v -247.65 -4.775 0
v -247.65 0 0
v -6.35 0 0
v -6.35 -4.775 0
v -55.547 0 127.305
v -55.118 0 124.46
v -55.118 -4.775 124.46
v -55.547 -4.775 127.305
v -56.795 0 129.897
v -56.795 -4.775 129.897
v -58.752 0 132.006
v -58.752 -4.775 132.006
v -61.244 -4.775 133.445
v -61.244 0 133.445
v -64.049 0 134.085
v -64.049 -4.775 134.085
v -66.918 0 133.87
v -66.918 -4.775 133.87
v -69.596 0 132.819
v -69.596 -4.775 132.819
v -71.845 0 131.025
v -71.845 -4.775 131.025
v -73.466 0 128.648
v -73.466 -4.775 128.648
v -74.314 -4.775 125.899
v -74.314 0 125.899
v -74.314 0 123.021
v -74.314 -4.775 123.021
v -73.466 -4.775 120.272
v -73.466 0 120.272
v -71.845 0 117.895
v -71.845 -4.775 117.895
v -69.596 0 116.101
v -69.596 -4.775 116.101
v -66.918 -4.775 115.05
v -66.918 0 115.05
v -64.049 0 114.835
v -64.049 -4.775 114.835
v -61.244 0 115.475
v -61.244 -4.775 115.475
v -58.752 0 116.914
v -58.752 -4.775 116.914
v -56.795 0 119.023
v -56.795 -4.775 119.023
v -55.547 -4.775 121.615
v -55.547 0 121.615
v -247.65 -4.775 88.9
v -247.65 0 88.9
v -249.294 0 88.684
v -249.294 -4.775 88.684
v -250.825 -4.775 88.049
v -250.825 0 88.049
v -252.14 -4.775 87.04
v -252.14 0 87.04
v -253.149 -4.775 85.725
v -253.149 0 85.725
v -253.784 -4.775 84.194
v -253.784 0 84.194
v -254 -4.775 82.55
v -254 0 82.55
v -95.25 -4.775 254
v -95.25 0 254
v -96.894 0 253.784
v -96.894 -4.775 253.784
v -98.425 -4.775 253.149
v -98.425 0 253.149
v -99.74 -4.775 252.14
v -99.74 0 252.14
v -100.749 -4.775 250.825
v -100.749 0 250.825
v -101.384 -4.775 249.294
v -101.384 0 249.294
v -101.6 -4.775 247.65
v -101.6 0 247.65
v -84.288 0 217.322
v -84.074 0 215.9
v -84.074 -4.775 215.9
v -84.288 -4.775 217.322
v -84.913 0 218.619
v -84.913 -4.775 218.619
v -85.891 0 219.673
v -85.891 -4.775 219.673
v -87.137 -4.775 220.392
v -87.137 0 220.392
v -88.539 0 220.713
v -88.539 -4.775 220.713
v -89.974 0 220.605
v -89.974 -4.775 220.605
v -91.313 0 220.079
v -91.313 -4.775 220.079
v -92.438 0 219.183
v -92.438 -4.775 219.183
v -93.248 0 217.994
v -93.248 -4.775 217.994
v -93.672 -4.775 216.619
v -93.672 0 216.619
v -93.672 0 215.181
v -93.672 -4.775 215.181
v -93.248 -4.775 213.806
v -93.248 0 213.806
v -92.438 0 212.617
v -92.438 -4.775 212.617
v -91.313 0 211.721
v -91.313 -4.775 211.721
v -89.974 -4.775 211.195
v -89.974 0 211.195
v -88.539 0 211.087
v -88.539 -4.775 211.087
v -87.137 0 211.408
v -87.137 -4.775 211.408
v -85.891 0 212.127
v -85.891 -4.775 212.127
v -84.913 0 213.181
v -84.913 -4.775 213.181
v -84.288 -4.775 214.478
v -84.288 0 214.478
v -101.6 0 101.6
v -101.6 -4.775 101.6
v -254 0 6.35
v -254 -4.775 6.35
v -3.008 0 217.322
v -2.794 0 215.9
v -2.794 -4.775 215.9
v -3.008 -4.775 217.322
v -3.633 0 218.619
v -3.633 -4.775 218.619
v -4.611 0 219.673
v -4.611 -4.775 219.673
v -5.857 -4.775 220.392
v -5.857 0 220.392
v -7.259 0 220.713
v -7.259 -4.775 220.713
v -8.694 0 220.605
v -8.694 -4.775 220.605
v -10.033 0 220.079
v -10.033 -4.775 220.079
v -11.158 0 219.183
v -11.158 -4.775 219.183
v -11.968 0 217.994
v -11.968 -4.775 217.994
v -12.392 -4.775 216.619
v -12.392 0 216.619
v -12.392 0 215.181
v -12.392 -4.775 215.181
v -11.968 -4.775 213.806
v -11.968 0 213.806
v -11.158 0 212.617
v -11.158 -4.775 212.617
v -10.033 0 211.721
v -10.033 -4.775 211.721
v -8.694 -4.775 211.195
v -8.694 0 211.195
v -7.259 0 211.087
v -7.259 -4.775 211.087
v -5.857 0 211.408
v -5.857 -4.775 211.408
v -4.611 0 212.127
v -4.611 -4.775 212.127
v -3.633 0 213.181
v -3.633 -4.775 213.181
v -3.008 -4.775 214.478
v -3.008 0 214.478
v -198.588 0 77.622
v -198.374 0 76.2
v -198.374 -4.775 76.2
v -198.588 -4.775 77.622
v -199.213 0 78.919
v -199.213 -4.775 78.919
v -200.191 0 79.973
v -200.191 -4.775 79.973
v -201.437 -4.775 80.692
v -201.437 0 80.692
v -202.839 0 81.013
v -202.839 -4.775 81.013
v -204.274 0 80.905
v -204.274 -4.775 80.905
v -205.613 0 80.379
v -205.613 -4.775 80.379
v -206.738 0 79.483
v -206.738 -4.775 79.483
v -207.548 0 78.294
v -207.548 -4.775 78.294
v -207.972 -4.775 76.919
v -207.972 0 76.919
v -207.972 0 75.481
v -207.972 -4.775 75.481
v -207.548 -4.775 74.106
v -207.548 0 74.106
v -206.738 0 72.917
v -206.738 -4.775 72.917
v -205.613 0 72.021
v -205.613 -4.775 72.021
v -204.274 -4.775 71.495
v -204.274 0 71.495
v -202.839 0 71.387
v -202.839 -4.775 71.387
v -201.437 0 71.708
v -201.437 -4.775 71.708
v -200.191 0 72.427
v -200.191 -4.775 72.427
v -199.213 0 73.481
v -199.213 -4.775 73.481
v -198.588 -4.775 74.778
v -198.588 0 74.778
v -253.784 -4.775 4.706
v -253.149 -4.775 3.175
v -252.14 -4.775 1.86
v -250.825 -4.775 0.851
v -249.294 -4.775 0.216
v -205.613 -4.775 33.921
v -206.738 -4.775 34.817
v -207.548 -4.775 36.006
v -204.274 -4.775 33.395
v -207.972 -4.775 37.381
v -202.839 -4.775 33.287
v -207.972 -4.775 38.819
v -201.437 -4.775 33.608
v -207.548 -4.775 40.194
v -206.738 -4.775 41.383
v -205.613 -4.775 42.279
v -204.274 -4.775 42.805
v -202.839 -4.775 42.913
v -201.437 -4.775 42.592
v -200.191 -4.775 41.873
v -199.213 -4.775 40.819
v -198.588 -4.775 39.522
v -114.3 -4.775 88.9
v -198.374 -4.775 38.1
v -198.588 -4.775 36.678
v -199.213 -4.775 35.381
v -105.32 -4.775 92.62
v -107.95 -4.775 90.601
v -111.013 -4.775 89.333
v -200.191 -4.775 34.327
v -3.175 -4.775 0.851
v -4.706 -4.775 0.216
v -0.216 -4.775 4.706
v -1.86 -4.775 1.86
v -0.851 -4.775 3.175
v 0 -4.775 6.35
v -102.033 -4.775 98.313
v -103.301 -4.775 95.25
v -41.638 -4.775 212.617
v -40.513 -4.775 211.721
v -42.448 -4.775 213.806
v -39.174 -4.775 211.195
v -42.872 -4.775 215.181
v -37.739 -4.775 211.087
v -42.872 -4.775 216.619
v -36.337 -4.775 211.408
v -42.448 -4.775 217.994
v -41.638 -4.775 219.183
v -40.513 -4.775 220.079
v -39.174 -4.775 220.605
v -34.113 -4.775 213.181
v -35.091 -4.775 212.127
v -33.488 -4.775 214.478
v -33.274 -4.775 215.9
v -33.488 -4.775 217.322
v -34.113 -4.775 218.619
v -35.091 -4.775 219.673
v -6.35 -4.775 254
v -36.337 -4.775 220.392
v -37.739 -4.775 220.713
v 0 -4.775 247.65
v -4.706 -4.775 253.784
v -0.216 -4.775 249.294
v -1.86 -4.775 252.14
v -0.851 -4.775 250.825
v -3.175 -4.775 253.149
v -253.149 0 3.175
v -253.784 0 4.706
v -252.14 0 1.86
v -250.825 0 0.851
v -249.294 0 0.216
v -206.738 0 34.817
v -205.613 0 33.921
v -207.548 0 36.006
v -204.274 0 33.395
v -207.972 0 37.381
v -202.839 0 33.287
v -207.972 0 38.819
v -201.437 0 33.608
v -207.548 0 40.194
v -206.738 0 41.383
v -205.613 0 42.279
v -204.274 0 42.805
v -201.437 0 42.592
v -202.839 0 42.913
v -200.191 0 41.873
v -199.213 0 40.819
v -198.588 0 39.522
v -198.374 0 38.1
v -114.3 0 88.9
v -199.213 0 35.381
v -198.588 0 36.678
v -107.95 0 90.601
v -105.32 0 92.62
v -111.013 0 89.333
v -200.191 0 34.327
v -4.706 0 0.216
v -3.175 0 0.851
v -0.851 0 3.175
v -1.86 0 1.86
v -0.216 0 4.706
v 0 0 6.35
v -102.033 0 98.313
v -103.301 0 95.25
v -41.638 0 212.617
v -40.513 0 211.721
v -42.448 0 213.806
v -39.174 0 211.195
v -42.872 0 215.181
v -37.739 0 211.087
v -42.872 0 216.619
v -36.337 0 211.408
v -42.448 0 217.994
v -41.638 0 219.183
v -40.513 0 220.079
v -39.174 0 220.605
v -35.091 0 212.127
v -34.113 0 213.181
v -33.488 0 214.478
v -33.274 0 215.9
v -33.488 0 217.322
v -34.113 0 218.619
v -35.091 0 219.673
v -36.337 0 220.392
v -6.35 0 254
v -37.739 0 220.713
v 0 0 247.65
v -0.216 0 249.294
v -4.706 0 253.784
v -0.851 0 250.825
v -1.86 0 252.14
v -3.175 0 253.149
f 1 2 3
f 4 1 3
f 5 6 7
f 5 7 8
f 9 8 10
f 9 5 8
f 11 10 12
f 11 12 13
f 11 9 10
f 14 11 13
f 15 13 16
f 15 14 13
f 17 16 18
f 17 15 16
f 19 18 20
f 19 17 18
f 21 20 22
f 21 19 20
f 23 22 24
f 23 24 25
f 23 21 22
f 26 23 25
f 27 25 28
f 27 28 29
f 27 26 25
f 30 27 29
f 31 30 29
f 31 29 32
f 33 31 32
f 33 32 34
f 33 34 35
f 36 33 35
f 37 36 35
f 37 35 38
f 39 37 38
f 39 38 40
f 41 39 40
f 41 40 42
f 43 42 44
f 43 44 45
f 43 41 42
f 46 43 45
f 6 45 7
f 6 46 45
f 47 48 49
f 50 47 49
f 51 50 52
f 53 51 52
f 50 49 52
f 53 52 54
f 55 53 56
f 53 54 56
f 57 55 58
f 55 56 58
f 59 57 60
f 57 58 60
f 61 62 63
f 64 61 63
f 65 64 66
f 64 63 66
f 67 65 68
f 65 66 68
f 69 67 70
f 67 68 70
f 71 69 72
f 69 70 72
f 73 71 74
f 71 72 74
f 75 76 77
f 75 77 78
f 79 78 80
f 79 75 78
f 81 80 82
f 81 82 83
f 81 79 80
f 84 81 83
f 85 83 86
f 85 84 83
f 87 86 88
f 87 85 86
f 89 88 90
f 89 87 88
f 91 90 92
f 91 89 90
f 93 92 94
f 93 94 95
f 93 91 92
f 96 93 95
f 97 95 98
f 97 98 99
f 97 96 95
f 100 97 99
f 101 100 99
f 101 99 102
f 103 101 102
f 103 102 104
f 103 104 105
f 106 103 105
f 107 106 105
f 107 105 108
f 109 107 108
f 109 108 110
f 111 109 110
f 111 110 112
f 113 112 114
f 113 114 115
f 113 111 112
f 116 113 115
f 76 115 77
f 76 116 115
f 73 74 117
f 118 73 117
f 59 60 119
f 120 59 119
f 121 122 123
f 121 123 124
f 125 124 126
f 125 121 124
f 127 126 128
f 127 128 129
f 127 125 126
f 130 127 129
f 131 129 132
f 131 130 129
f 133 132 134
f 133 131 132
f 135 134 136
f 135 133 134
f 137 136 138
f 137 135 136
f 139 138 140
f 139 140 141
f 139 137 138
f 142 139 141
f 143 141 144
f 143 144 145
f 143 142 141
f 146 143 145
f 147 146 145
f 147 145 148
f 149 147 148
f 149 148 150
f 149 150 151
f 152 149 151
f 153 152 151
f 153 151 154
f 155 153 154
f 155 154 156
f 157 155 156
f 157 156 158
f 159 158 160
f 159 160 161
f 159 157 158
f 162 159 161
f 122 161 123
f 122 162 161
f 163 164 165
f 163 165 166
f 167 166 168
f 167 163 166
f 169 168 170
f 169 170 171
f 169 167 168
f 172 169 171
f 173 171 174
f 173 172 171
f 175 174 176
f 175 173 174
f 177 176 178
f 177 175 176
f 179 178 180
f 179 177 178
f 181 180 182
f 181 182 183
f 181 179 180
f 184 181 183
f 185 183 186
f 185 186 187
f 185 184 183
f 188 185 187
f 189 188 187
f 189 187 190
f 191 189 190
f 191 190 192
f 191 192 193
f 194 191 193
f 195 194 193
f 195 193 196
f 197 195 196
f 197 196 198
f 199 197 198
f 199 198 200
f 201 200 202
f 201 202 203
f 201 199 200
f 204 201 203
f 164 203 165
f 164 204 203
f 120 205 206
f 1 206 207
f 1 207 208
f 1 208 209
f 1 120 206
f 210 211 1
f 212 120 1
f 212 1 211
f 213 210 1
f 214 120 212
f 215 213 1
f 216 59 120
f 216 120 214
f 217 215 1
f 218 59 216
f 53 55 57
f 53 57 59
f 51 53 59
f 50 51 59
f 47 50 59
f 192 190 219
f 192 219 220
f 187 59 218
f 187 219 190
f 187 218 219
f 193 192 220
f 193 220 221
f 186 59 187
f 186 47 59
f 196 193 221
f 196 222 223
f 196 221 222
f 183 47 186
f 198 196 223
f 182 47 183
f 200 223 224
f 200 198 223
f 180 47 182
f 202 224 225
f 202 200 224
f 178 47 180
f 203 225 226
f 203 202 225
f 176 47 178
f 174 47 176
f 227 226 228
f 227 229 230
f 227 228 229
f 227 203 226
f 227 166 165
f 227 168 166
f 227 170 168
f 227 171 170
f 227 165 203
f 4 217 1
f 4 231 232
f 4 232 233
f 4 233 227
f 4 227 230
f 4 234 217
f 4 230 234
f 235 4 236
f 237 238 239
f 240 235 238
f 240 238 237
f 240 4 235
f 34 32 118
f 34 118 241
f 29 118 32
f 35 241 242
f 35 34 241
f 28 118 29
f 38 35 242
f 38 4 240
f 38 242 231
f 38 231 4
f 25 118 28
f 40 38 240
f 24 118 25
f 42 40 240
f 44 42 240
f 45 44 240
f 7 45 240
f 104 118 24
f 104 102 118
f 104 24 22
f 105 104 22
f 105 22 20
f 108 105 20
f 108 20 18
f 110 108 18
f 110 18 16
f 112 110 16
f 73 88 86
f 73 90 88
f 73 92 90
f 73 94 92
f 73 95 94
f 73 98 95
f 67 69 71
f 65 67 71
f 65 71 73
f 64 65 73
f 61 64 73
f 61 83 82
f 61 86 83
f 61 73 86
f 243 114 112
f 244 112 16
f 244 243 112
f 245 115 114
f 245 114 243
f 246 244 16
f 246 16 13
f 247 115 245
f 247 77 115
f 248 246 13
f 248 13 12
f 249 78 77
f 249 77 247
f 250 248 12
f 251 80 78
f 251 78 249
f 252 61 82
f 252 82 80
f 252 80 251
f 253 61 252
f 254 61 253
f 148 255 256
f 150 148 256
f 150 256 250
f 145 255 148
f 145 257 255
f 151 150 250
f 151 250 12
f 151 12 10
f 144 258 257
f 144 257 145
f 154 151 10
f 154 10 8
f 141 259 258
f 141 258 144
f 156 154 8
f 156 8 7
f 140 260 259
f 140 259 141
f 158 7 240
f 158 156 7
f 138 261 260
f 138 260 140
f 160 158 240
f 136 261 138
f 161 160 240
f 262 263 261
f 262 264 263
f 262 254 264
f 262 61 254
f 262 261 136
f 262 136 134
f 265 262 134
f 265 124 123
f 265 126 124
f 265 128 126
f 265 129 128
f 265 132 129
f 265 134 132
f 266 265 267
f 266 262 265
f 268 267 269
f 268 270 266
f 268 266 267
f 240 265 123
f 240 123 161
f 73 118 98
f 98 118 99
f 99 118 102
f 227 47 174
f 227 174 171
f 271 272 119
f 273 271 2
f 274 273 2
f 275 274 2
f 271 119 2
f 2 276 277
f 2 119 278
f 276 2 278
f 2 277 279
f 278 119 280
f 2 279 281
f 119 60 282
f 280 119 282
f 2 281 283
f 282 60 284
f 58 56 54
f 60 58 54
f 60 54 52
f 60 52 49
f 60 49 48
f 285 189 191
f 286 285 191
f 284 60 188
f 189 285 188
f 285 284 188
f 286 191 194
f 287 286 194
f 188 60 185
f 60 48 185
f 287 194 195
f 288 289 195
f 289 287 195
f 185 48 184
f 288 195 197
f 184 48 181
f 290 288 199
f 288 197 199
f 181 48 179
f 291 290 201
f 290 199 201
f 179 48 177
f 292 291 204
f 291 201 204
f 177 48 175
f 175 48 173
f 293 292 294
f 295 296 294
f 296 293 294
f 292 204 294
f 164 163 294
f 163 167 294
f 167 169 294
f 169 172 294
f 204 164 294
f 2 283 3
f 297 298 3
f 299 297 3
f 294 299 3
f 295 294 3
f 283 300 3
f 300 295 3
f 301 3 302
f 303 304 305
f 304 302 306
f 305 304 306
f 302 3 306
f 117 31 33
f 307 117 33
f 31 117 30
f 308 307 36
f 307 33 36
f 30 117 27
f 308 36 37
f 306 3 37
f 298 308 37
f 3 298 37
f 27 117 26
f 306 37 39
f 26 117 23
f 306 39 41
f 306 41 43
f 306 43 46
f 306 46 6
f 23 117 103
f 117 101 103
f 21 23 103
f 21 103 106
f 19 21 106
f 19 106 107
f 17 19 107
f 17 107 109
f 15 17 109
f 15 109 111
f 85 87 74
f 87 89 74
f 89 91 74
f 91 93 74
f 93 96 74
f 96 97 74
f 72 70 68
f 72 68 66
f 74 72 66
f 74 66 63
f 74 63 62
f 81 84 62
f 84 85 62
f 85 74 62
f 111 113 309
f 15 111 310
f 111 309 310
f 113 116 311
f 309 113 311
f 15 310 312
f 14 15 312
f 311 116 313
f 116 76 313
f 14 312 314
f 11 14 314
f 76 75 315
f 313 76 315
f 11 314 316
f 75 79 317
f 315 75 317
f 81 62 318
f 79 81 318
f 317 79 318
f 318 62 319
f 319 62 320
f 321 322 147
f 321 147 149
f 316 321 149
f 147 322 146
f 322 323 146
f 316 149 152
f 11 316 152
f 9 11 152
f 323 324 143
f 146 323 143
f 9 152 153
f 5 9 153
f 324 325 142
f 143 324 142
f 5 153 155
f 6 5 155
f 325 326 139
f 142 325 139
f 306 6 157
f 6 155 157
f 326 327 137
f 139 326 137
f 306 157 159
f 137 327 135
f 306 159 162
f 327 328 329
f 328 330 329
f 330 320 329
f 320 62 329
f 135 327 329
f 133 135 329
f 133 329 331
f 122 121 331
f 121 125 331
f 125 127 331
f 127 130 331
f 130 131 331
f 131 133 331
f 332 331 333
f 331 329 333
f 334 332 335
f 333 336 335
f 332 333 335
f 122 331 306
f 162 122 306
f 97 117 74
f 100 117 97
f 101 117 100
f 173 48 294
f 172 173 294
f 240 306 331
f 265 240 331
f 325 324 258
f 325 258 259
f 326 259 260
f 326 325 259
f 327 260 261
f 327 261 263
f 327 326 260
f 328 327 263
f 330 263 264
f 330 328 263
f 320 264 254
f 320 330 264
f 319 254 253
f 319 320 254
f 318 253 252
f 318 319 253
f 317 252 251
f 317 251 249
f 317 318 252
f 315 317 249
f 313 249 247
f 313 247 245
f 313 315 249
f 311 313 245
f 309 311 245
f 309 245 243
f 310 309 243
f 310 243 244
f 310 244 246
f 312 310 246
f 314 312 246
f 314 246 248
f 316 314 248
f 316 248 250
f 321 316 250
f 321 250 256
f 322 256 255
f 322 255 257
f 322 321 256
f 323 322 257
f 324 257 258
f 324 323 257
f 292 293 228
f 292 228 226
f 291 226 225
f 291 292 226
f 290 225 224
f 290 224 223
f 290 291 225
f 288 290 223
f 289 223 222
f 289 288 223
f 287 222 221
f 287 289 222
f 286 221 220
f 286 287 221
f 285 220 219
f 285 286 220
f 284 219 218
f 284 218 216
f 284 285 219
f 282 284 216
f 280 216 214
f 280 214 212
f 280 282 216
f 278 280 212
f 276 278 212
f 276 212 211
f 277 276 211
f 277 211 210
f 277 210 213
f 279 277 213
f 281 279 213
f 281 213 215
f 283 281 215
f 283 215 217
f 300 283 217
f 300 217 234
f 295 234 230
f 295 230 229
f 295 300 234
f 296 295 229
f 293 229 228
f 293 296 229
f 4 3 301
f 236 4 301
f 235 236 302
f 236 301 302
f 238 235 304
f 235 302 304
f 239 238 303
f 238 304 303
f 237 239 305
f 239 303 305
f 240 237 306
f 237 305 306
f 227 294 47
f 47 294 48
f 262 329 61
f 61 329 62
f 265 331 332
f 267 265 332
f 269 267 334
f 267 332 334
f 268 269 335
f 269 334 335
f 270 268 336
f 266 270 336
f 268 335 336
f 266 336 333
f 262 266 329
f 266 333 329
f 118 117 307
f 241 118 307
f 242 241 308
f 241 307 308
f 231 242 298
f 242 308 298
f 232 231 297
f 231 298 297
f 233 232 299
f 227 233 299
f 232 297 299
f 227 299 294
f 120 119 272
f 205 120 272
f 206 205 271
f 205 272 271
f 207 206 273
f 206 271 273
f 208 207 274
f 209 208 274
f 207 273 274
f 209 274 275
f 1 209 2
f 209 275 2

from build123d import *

# Parameters (mm, degrees)
F0_R     = 4.826
F0_R_2   = 9.525
F0_R_3   = 9.652
F1_DEPTH = 4.7752


with BuildPart() as f1:
    # F0 (on Front) → F1 (new body)
    with BuildSketch(Plane.XZ):
        with BuildLine():
            ThreePointArc((-6.35, 0), (-1.859872, 1.859872), (0, 6.35))
            Line((0, 6.35), (0, 247.65))
            ThreePointArc((0, 247.65), (-1.859872, 252.140128), (-6.35, 254))
            Line((-6.35, 254), (-95.25, 254))
            ThreePointArc((-95.25, 254), (-99.740128, 252.140128), (-101.6, 247.65))
            Line((-101.6, 247.65), (-101.6, 176.188146))
            ThreePointArc((-101.6, 176.188146), (-35.670644, 180.900035), (-1.27, 124.46))
            ThreePointArc((-1.27, 124.46), (-46.17483, 63.743695), (-117.379281, 88.9))
            Line((-117.379281, 88.9), (-247.65, 88.9))
            ThreePointArc((-247.65, 88.9), (-252.140128, 87.040128), (-254, 82.55))
            Line((-254, 82.55), (-254, 6.35))
            ThreePointArc((-254, 6.35), (-252.140128, 1.859872), (-247.65, 0))
            Line((-247.65, 0), (-6.35, 0))
        make_face()
        with Locations((-203.2, 38.1)):
            Circle(F0_R, mode=Mode.SUBTRACT)
        with Locations((-203.2, 76.2)):
            Circle(F0_R, mode=Mode.SUBTRACT)
        with Locations((-33.35242, 48.26)):
            Circle(F0_R_2, mode=Mode.SUBTRACT)
        with Locations((-88.9, 215.9)):
            Circle(F0_R, mode=Mode.SUBTRACT)
        with Locations((-38.1, 215.9)):
            Circle(F0_R, mode=Mode.SUBTRACT)
        with Locations((-7.62, 215.9)):
            Circle(F0_R, mode=Mode.SUBTRACT)
        with Locations((-33.35242, 48.26)):
            Circle(F0_R_2)
        with BuildLine():
            ThreePointArc((-1.27, 124.46), (-35.670644, 180.900035), (-101.6, 176.188146))
            Line((-101.6, 176.188146), (-101.6, 101.6))
            ThreePointArc((-101.6, 101.6), (-105.319744, 92.619744), (-114.3, 88.9))
            Line((-114.3, 88.9), (-117.379281, 88.9))
            ThreePointArc((-117.379281, 88.9), (-46.17483, 63.743695), (-1.27, 124.46))
        make_face()
        with Locations((-64.77, 124.46)):
            Circle(F0_R_3, mode=Mode.SUBTRACT)
    extrude(amount=F1_DEPTH)


solid = f1.part
